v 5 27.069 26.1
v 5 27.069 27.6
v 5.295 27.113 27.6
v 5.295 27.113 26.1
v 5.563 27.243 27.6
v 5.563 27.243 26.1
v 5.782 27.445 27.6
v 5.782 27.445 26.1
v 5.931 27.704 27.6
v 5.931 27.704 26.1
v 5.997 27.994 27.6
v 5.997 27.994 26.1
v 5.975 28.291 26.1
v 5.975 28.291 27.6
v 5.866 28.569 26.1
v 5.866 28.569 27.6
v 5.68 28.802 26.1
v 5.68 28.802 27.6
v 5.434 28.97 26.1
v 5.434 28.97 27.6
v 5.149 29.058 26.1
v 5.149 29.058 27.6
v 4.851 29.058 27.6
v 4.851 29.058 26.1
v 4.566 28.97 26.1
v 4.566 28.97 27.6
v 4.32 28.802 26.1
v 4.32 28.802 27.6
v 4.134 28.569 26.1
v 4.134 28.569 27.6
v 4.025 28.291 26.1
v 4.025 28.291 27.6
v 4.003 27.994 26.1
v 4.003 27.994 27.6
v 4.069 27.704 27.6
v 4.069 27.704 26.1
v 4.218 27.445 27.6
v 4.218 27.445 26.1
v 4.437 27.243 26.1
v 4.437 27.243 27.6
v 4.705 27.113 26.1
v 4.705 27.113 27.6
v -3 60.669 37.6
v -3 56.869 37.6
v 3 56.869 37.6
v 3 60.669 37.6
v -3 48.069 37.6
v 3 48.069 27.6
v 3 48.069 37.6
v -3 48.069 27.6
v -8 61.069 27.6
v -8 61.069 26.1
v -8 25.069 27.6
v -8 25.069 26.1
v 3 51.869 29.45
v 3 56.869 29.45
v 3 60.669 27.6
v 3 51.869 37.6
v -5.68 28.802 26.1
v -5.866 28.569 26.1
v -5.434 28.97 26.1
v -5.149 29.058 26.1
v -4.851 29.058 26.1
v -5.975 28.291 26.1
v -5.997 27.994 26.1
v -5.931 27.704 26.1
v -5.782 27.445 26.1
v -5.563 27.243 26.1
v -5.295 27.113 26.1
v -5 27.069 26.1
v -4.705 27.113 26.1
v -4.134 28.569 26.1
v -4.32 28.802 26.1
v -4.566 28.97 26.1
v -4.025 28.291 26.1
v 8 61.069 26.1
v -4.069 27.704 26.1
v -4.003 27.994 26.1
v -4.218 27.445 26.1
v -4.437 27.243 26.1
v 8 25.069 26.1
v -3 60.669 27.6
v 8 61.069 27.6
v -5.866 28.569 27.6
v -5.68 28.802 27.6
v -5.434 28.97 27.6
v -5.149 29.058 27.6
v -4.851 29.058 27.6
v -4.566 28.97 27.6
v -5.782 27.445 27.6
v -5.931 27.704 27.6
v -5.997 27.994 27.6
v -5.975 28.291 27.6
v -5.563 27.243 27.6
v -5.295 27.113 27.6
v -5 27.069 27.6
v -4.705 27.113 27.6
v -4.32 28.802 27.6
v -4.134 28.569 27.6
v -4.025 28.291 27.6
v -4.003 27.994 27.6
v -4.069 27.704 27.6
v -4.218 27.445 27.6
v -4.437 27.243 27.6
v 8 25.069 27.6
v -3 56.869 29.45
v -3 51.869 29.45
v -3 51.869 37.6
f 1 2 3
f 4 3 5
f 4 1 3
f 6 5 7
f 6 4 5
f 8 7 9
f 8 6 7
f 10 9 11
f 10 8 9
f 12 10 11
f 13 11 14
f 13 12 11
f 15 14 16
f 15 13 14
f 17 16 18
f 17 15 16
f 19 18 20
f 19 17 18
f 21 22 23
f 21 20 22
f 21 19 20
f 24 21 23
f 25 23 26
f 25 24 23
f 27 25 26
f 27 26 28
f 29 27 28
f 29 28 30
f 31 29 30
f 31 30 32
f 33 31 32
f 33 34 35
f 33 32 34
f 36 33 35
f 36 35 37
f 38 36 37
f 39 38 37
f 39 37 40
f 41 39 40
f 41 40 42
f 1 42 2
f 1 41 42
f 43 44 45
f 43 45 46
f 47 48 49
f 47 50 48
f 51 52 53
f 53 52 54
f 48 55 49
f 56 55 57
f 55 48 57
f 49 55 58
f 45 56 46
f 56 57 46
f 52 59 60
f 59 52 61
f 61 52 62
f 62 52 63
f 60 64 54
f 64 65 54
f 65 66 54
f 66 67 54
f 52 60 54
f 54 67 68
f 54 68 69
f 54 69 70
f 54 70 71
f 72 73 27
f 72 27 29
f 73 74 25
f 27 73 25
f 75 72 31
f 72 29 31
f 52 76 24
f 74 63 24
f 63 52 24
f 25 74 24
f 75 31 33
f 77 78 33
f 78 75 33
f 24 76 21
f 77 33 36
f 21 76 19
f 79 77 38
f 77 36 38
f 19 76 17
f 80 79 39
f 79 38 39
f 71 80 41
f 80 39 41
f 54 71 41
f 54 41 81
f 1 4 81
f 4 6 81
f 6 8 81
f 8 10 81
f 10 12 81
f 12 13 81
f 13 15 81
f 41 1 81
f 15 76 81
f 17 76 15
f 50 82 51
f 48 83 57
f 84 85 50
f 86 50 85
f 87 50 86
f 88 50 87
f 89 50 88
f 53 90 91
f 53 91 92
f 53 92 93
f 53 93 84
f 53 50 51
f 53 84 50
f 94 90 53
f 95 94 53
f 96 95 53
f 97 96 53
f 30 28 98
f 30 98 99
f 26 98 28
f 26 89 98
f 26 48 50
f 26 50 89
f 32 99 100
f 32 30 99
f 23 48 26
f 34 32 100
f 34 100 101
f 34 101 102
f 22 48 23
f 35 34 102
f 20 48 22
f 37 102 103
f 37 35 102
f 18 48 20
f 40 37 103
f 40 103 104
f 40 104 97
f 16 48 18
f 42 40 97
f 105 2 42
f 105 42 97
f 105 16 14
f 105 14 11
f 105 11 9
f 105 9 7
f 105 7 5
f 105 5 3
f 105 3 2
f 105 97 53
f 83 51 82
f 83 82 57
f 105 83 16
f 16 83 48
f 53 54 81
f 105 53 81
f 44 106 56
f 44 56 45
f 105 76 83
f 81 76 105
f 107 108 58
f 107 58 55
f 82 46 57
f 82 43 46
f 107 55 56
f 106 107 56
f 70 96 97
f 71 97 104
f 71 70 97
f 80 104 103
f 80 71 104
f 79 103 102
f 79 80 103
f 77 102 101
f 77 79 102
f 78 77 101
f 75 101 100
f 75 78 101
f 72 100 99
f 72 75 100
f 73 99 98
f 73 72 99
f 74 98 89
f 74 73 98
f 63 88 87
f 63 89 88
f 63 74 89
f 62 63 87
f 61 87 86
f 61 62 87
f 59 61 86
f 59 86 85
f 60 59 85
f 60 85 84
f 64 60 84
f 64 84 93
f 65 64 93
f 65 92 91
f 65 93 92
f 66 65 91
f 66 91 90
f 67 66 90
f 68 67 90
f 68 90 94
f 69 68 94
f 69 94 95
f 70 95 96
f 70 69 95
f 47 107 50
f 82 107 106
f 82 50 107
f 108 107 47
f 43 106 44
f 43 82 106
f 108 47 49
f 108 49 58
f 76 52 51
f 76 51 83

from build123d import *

# Parameters (mm, degrees)
CYLINDER1054_R           = 1
CYLINDER1054_DEPTH       = 5
CYLINDER1055_R           = 1
CYLINDER1055_DEPTH       = 5
BOX258_W                 = 36
BOX258_H                 = 16
BOX258_DEPTH             = 1.5
PAD042_DEPTH             = 3
CLONE020_PLACEMENT_ANGLE = -90


with BuildPart() as cylinder1062:
    # Cylinder1054 → Cylinder1054 (new body)
    with BuildSketch(Plane(origin=(33, 3, 0), x_dir=(1, 0, 0), z_dir=(0, 0, 1))):
        Circle(CYLINDER1054_R)
    extrude(amount=CYLINDER1054_DEPTH)


with BuildPart() as fusion151:
    # Cylinder1055 → Cylinder1055 (new body)
    with BuildSketch(Plane(origin=(33, 13, 0), x_dir=(1, 0, 0), z_dir=(0, 0, 1))):
        Circle(CYLINDER1055_R)
    extrude(amount=CYLINDER1055_DEPTH)

    # Fusion151: union Cylinder1062
    add(cylinder1062.part)


with BuildPart() as cut:
    # Box258 → Box258 (new body)
    with BuildSketch(Plane.XY):
        with Locations((18, 8)):
            Rectangle(BOX258_W, BOX258_H)
    extrude(amount=BOX258_DEPTH)

    # Cut: cut Fusion151
    add(fusion151.part, mode=Mode.SUBTRACT)


with BuildPart() as clone_of_optopcba:
    # Sketch067 → Pad042 (new body, symmetric)
    with BuildSketch(Plane(origin=(13, 8, 1.5), x_dir=(0, 0, 1), z_dir=(0, -1, 0))):
        Polygon((0, 0), (10, 0), (10, 3.8), (1.85, 3.8), (1.85, 8.8), (10, 8.8), (10, 12.6), (0, 12.6), align=None)
    extrude(amount=PAD042_DEPTH, both=True)

    # Fusion152: union Cut
    add(cut.part)


with BuildPart() as clone_of_optopcba_1:
    # Clone020 placement: moved
    add(clone_of_optopcba.part.moved(Location((-8, 61.0689, 26.1))).rotate(Axis((-8, 61.0689, 26.1), (0, 0, 1)), CLONE020_PLACEMENT_ANGLE))


solid = clone_of_optopcba_1.part
